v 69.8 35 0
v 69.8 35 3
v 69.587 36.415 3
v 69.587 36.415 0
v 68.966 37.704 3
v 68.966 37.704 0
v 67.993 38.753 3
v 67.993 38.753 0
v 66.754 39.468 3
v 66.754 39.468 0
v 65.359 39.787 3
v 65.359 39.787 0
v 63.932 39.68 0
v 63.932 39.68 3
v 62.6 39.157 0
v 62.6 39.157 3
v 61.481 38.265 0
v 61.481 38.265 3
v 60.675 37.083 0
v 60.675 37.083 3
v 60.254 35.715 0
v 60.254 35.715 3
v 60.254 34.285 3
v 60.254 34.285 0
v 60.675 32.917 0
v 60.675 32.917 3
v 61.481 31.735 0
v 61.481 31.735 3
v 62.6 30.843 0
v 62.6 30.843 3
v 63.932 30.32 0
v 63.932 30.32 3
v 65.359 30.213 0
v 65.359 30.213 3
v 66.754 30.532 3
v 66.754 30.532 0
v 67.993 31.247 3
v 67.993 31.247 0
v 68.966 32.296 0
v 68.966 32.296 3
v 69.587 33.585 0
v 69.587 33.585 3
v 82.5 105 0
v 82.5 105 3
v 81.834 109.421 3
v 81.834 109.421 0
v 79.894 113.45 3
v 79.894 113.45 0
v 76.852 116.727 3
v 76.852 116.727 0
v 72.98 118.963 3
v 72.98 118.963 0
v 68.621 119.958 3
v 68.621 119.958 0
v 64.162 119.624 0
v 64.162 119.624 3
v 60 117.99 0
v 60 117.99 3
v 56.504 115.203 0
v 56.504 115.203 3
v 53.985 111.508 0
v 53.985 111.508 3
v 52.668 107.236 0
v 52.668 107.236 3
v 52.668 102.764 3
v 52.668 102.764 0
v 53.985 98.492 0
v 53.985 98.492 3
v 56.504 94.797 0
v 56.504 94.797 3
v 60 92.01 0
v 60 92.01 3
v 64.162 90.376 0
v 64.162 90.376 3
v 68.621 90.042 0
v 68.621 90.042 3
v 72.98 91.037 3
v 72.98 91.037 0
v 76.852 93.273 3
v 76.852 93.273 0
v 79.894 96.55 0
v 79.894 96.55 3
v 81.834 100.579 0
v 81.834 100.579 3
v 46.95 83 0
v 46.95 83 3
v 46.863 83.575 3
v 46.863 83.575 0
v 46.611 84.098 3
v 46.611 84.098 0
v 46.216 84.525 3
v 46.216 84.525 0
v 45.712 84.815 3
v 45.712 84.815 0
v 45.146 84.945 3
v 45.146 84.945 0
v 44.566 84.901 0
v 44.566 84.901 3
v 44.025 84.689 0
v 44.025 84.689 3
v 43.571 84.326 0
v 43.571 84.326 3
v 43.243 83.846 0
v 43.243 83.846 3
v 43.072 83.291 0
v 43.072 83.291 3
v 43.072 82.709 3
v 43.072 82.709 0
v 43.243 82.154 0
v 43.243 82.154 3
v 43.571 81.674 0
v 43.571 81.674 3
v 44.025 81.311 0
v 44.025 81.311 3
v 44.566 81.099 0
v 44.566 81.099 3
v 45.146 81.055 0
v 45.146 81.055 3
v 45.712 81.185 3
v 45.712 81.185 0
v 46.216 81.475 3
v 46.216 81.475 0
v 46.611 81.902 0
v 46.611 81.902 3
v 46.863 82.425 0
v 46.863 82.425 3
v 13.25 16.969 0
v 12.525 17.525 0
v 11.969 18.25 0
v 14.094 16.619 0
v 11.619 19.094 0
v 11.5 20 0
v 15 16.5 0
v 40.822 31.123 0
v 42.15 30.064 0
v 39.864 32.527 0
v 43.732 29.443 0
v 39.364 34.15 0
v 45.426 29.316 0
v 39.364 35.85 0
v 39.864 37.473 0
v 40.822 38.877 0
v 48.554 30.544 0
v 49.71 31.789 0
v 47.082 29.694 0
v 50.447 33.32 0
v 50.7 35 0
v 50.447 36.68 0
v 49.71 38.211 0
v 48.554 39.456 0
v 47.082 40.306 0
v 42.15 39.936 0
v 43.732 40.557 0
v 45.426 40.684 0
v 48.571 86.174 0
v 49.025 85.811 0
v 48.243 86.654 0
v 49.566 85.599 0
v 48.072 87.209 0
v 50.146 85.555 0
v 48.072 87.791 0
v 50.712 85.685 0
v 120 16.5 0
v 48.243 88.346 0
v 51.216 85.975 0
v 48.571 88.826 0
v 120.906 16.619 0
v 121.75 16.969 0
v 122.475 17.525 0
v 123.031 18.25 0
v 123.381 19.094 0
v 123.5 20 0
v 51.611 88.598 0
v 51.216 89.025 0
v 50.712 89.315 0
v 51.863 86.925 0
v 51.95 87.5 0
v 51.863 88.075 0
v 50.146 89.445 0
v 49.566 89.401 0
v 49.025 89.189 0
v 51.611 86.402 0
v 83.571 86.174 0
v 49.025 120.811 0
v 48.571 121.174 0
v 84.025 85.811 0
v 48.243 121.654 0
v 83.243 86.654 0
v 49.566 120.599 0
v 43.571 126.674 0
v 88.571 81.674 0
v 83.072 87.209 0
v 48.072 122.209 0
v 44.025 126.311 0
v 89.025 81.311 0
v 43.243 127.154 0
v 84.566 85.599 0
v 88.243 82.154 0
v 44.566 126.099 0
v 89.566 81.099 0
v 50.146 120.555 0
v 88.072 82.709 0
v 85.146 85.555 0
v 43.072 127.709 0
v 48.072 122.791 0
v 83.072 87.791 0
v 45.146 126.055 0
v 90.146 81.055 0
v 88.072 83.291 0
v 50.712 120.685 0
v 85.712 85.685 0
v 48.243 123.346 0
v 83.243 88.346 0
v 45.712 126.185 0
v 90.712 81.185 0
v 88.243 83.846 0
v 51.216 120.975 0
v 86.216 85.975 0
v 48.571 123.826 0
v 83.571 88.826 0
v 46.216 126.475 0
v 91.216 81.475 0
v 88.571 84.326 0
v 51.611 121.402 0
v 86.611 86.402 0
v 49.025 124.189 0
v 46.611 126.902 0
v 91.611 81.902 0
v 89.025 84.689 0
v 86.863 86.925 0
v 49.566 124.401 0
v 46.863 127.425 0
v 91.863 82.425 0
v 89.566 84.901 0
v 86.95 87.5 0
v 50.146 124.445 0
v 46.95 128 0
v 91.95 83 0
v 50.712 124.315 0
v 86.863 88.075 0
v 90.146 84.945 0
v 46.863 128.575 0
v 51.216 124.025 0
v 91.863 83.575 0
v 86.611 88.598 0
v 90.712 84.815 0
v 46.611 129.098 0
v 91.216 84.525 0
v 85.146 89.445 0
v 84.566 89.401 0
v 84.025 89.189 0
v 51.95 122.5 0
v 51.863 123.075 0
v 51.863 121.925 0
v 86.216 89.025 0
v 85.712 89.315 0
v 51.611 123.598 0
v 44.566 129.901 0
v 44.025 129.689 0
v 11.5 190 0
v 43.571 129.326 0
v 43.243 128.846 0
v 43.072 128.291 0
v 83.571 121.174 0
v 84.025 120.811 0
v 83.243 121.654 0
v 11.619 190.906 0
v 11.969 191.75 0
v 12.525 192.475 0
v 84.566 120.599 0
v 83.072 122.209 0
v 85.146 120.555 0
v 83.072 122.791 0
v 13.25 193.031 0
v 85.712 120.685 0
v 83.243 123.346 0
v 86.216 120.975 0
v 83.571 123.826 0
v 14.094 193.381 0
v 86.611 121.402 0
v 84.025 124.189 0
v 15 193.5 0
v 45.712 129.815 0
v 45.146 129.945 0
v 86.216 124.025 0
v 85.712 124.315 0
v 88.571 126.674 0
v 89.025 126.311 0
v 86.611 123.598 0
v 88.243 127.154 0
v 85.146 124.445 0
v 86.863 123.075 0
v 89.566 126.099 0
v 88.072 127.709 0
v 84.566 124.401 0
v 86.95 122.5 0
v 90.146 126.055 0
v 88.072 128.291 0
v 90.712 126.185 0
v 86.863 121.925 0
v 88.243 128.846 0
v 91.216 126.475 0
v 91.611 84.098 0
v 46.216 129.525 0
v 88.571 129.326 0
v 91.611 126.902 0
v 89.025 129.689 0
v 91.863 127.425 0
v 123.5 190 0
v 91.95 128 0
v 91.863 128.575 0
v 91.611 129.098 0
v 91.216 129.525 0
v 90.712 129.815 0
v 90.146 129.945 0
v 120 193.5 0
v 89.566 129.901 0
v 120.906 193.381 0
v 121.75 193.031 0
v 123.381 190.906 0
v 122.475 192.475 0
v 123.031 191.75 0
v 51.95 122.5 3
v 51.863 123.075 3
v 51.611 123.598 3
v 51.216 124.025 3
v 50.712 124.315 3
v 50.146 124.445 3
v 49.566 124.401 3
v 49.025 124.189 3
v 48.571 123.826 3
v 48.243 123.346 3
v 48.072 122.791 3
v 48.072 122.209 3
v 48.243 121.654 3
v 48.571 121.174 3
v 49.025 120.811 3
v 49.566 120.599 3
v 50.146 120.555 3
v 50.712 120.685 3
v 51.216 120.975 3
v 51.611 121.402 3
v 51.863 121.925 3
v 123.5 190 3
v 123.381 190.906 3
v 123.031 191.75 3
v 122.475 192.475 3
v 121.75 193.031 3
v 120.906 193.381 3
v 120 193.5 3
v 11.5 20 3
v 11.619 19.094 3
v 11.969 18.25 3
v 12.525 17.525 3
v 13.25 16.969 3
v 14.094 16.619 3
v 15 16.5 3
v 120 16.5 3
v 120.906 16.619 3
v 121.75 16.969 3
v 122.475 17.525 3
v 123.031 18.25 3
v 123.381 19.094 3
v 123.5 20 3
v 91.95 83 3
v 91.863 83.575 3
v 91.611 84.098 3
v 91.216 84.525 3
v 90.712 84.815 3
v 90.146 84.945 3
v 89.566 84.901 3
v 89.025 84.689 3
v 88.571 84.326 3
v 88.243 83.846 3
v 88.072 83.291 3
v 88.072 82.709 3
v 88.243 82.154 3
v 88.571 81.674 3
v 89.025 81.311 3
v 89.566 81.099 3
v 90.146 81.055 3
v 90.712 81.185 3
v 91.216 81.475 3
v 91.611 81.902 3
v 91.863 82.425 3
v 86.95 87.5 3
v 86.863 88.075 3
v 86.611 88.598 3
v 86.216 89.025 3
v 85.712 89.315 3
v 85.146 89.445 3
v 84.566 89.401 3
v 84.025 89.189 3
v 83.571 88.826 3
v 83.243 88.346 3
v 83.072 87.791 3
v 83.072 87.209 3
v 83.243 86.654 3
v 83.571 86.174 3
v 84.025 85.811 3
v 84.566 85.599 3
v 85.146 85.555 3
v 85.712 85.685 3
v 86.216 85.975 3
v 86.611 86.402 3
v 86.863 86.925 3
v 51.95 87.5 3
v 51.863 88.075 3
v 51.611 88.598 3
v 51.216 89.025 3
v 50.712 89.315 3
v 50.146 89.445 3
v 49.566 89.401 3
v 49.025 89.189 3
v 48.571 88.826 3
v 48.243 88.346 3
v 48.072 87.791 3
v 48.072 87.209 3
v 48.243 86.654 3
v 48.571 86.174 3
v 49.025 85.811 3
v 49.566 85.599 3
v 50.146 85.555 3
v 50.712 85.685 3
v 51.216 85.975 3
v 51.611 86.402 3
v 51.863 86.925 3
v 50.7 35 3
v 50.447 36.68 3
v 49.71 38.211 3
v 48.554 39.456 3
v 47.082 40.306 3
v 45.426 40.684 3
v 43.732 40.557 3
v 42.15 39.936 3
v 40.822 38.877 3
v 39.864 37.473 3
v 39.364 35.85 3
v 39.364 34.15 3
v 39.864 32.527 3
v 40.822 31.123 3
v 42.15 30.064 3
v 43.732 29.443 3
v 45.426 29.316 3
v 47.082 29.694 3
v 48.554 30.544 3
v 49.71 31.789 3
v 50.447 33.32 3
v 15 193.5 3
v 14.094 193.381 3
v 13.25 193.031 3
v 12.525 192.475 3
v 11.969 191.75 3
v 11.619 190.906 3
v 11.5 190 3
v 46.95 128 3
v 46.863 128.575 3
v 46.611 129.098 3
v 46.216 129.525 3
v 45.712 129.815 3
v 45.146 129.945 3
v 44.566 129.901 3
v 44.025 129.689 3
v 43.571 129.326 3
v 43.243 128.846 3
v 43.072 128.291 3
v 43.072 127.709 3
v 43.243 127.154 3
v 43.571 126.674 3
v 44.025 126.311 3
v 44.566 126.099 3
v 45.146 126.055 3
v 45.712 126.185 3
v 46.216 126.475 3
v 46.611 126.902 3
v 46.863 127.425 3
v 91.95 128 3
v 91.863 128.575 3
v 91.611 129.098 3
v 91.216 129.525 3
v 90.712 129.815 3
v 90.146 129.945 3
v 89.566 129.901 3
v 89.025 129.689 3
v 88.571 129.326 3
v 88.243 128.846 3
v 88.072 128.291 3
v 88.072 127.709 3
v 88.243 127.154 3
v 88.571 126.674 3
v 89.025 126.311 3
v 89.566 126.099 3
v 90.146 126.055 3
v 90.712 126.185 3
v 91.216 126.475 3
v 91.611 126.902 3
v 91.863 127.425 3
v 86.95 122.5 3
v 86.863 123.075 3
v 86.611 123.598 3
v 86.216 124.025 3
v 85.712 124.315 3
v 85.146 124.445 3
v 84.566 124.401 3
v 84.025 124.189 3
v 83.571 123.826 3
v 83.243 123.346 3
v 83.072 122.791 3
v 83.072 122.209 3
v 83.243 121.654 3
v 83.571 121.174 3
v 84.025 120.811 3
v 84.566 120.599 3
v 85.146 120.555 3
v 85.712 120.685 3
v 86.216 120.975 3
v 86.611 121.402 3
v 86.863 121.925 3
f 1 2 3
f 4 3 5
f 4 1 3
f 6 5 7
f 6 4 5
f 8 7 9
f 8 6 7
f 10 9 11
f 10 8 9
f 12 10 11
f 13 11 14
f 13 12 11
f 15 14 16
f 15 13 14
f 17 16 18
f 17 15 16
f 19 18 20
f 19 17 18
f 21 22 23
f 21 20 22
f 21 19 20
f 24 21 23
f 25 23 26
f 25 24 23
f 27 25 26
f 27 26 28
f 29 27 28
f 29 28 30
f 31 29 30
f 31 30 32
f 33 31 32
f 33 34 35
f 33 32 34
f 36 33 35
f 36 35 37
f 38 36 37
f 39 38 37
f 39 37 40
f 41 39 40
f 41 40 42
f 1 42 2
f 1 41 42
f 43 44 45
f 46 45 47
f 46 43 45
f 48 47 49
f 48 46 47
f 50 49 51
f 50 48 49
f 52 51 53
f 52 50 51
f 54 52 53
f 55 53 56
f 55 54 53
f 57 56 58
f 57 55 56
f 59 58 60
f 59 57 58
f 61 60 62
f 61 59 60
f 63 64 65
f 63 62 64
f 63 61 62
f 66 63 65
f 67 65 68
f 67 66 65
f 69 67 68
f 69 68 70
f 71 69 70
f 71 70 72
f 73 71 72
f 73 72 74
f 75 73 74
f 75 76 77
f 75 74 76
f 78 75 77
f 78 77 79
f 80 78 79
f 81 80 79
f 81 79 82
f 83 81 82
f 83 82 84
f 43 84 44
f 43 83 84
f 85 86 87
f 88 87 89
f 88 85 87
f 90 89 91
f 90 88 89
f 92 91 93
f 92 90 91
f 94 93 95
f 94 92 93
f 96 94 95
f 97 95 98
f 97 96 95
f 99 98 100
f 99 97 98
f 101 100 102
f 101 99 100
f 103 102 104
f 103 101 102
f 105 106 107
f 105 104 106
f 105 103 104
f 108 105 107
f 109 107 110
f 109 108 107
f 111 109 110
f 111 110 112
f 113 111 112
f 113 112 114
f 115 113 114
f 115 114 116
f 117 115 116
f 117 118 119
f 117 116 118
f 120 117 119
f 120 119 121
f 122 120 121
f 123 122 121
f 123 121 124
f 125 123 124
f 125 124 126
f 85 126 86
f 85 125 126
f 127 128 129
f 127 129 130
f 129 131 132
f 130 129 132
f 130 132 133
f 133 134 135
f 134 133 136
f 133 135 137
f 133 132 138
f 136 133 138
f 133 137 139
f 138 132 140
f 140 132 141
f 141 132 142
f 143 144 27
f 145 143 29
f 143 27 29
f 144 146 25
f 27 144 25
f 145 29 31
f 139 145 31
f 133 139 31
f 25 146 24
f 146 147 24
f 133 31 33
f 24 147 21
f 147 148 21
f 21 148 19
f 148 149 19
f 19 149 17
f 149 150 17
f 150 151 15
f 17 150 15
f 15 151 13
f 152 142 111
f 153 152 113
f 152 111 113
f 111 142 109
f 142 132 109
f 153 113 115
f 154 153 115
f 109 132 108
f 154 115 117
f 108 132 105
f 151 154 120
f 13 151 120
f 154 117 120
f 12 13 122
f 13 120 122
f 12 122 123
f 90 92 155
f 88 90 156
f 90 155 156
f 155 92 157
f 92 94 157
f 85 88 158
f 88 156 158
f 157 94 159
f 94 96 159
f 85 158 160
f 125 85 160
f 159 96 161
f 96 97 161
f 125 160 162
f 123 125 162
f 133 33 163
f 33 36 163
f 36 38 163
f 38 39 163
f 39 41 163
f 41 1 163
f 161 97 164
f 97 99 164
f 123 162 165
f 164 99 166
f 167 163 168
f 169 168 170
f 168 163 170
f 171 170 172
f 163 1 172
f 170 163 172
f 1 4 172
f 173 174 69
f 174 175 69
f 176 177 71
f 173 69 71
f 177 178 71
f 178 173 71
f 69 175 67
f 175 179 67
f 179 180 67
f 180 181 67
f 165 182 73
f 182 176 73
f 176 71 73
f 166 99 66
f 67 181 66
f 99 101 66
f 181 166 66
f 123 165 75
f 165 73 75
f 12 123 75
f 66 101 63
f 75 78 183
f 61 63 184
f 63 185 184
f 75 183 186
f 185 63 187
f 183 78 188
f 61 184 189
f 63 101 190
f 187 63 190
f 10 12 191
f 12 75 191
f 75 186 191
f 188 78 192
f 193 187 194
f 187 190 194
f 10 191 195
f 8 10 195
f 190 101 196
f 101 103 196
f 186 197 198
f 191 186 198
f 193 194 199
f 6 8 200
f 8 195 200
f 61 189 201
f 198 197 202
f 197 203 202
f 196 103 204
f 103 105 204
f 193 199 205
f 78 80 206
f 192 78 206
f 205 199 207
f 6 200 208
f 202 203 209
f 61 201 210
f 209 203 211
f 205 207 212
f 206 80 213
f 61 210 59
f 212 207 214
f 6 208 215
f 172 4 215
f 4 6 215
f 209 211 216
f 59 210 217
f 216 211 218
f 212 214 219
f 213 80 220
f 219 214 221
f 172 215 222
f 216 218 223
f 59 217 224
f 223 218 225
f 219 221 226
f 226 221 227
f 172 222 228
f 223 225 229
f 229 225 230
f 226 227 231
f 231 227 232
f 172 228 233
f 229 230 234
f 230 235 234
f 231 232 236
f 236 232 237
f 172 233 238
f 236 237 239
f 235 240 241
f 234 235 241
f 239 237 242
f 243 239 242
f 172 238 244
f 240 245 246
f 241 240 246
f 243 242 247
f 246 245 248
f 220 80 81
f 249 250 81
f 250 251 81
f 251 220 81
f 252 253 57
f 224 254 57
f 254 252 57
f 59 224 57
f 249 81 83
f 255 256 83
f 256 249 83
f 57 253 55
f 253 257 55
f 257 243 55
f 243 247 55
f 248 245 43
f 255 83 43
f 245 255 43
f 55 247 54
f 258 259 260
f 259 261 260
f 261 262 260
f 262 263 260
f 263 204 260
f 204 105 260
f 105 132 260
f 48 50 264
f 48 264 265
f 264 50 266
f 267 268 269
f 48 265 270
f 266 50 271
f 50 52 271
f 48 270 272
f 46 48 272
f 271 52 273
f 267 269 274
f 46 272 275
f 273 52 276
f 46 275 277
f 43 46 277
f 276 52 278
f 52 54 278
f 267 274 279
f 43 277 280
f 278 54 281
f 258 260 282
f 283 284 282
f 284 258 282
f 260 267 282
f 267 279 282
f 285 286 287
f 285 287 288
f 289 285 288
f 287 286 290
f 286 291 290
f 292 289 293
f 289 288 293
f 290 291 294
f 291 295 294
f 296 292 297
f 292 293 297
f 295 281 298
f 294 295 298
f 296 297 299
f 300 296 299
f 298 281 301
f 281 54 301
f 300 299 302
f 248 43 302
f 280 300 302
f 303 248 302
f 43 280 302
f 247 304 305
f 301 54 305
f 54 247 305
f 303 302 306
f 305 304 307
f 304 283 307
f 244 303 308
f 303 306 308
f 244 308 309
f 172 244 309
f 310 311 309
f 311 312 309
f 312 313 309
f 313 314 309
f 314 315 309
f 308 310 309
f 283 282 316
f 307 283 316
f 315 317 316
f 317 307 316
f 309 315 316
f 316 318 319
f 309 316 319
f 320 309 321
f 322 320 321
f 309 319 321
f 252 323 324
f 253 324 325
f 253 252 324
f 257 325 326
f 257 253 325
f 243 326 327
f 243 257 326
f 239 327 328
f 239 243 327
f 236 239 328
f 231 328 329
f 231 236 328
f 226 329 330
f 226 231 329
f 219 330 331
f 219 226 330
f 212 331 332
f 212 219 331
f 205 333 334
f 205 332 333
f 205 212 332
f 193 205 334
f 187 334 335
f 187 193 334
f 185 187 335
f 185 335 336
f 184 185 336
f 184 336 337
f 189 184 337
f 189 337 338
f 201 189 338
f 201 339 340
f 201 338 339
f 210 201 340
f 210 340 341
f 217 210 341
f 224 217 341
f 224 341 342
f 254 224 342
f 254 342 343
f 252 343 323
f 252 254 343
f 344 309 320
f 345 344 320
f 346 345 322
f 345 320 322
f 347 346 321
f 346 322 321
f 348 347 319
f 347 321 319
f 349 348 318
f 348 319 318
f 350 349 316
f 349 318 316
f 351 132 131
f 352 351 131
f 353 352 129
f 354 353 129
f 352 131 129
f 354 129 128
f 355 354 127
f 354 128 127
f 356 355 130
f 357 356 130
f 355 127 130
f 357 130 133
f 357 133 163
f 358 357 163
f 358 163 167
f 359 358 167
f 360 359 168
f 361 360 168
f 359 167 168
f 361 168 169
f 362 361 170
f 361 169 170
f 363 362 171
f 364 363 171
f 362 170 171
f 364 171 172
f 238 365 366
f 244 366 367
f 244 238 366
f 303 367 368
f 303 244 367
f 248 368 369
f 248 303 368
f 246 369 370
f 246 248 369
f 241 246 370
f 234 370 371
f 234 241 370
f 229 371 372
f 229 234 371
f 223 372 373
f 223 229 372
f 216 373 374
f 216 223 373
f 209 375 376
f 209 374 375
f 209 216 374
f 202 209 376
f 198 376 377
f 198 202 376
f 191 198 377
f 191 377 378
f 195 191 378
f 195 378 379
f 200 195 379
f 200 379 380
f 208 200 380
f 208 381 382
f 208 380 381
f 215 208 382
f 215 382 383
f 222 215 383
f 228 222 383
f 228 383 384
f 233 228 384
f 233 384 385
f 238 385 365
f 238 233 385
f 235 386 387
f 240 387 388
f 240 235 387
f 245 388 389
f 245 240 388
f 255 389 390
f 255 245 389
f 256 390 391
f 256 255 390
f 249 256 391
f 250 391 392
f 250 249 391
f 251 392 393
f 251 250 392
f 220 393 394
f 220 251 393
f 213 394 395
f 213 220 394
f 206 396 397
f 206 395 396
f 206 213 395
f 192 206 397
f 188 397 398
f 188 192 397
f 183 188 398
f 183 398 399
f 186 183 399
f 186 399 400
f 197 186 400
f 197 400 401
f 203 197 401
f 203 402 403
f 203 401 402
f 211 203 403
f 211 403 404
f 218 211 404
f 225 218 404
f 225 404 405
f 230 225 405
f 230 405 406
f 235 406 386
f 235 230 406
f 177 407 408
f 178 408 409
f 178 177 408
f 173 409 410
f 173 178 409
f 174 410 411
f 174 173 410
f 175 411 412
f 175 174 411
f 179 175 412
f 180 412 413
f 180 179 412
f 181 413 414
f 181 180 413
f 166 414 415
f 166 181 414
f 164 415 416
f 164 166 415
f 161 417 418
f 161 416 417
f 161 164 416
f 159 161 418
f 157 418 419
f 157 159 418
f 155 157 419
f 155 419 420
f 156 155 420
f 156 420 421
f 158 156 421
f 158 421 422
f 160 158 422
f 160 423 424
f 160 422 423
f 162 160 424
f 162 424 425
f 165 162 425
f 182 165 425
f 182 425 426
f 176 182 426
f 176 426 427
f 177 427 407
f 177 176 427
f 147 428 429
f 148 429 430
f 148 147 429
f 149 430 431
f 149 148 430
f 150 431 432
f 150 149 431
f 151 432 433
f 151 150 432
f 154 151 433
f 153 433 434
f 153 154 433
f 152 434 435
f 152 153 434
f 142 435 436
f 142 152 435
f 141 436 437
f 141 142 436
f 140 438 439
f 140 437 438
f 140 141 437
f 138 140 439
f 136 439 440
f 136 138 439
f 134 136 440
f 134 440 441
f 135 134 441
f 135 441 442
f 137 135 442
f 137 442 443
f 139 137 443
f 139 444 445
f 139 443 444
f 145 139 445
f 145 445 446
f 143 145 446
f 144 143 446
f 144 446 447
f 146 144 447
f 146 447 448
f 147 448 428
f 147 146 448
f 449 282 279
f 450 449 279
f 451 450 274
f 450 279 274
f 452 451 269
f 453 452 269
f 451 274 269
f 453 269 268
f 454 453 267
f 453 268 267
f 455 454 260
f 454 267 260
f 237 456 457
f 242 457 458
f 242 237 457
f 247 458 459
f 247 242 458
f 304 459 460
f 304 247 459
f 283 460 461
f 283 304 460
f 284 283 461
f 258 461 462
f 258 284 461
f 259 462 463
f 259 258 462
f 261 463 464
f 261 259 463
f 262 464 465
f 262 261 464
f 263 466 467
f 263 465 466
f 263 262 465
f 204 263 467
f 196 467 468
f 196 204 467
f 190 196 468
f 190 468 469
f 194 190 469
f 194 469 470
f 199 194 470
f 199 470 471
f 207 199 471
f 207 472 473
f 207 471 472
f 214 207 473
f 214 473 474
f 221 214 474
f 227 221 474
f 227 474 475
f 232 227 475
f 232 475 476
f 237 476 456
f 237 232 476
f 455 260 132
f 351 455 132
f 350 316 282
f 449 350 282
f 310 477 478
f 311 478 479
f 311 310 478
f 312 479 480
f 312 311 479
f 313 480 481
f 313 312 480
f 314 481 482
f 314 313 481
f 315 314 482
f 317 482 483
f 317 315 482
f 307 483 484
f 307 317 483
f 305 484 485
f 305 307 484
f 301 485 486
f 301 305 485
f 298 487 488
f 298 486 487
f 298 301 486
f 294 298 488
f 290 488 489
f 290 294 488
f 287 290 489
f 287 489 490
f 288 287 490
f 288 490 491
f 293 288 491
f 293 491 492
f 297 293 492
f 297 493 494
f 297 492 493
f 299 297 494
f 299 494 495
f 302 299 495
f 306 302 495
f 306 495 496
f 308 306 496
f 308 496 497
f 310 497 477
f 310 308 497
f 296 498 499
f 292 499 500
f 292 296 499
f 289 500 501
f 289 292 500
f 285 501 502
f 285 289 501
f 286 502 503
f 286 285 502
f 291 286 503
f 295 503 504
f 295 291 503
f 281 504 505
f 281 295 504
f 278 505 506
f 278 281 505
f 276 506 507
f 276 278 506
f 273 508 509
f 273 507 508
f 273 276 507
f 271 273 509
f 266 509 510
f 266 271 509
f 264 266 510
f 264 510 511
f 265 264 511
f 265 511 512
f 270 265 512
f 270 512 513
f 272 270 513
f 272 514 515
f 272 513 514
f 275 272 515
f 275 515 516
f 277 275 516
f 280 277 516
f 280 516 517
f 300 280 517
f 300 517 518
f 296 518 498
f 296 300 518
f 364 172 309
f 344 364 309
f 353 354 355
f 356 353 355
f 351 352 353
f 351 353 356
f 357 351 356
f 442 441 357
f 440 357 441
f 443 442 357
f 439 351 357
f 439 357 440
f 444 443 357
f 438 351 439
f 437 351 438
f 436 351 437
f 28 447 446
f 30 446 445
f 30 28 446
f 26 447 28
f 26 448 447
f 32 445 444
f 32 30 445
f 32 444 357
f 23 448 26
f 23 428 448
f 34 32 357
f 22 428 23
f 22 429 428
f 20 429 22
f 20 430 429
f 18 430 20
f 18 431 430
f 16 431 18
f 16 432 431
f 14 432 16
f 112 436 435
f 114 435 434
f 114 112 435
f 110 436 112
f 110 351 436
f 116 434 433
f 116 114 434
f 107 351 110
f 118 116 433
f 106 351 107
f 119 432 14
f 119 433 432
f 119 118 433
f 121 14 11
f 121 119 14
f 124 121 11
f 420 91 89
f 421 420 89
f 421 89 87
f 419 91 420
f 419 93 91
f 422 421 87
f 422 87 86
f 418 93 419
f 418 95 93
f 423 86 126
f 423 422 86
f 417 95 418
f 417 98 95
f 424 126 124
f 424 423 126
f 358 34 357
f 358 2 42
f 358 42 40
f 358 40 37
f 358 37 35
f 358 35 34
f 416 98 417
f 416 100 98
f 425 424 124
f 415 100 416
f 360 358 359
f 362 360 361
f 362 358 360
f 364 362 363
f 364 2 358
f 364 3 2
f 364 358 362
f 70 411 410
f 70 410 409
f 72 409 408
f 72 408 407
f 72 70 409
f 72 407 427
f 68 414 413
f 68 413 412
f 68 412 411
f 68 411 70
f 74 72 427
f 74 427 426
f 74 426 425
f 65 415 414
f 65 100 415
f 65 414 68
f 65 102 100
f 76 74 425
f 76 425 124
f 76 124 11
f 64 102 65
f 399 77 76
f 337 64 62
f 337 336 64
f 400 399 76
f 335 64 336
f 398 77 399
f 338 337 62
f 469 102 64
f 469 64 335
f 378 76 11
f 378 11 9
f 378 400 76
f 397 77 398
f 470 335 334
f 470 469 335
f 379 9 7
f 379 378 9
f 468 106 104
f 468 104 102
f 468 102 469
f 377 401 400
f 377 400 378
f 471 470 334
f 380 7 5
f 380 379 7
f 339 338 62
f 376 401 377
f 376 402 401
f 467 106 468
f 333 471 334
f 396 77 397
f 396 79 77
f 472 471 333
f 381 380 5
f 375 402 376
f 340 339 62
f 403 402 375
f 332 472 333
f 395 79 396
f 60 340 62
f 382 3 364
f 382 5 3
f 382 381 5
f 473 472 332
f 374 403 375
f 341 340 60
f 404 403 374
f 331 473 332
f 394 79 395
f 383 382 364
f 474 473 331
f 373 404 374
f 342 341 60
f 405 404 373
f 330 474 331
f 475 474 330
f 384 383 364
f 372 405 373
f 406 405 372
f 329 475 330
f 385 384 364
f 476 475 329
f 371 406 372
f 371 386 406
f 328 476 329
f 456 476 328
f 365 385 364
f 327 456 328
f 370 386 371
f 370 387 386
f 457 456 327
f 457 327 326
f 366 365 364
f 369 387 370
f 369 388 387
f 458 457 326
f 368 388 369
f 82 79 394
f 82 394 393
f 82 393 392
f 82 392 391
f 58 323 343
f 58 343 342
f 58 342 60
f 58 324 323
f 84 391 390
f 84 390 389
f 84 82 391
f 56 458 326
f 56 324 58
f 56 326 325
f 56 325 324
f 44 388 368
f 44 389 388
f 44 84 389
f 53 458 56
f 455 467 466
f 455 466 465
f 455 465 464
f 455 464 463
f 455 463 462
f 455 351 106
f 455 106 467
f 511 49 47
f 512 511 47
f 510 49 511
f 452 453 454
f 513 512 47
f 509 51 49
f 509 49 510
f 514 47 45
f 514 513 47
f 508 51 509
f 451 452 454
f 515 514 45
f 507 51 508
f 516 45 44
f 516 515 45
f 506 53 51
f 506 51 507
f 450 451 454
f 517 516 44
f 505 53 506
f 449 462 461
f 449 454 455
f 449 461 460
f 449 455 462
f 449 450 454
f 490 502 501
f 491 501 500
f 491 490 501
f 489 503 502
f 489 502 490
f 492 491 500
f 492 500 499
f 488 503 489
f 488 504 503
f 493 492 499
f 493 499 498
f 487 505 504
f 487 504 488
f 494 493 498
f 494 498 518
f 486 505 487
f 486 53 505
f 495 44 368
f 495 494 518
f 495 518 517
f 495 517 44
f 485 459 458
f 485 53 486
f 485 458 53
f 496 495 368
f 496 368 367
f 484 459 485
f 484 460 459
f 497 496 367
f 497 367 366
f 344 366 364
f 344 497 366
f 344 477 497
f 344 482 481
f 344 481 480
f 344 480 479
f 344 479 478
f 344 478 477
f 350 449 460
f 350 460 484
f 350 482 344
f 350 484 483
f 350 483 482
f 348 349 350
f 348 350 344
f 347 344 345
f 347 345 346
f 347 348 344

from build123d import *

# Parameters (mm, degrees)
PAD_DEPTH     = 3
SKETCH002_R   = 1.95
HOLE_DEPTH    = 3.001
SKETCH_R      = 15
HOLE001_DEPTH = 3.001
SKETCH003_R   = 1.95
HOLE002_DEPTH = 3.001
SKETCH004_R   = 5.7
SKETCH004_R_2 = 4.8
POCKET_DEPTH  = 3.001


with BuildPart() as part:
    # Sketch001 → Pad (new body)
    with BuildSketch(Plane.XY):
        with BuildLine():
            Line((11.5, 190), (11.5, 20))
            ThreePointArc((11.5, 20), (12.525126, 17.525126), (15, 16.5))
            Line((15, 16.5), (120, 16.5))
            ThreePointArc((120, 16.5), (122.474874, 17.525126), (123.5, 20))
            Line((123.5, 20), (123.5, 190))
            ThreePointArc((123.5, 190), (122.474874, 192.474874), (120, 193.5))
            Line((120, 193.5), (15, 193.5))
            ThreePointArc((15, 193.5), (12.525126, 192.474874), (11.5, 190))
        make_face()
    extrude(amount=PAD_DEPTH)

    # Sketch002 → Hole (cut, through all)
    with BuildSketch(Plane.XY):
        with Locations((50, 87.5)):
            Circle(SKETCH002_R)
        with Locations((85, 87.5)):
            Circle(SKETCH002_R)
        with Locations((85, 122.5)):
            Circle(SKETCH002_R)
        with Locations((50, 122.5)):
            Circle(SKETCH002_R)
    extrude(amount=HOLE_DEPTH, mode=Mode.SUBTRACT)

    # Sketch → Hole001 (cut, through all)
    with BuildSketch(Plane.XY):
        with Locations((67.5, 105)):
            Circle(SKETCH_R)
    extrude(amount=HOLE001_DEPTH, mode=Mode.SUBTRACT)

    # Sketch003 → Hole002 (cut, through all)
    with BuildSketch(Plane.XY):
        with Locations((90, 83)):
            Circle(SKETCH003_R)
        with Locations((45, 83)):
            Circle(SKETCH003_R)
        with Locations((45, 128)):
            Circle(SKETCH003_R)
        with Locations((90, 128)):
            Circle(SKETCH003_R)
    extrude(amount=HOLE002_DEPTH, mode=Mode.SUBTRACT)

    # Sketch004 → Pocket (cut, through all)
    with BuildSketch(Plane.XY):
        with Locations((45, 35)):
            Circle(SKETCH004_R)
        with Locations((65, 35)):
            Circle(SKETCH004_R_2)
    extrude(amount=POCKET_DEPTH, mode=Mode.SUBTRACT)


solid = part.part
